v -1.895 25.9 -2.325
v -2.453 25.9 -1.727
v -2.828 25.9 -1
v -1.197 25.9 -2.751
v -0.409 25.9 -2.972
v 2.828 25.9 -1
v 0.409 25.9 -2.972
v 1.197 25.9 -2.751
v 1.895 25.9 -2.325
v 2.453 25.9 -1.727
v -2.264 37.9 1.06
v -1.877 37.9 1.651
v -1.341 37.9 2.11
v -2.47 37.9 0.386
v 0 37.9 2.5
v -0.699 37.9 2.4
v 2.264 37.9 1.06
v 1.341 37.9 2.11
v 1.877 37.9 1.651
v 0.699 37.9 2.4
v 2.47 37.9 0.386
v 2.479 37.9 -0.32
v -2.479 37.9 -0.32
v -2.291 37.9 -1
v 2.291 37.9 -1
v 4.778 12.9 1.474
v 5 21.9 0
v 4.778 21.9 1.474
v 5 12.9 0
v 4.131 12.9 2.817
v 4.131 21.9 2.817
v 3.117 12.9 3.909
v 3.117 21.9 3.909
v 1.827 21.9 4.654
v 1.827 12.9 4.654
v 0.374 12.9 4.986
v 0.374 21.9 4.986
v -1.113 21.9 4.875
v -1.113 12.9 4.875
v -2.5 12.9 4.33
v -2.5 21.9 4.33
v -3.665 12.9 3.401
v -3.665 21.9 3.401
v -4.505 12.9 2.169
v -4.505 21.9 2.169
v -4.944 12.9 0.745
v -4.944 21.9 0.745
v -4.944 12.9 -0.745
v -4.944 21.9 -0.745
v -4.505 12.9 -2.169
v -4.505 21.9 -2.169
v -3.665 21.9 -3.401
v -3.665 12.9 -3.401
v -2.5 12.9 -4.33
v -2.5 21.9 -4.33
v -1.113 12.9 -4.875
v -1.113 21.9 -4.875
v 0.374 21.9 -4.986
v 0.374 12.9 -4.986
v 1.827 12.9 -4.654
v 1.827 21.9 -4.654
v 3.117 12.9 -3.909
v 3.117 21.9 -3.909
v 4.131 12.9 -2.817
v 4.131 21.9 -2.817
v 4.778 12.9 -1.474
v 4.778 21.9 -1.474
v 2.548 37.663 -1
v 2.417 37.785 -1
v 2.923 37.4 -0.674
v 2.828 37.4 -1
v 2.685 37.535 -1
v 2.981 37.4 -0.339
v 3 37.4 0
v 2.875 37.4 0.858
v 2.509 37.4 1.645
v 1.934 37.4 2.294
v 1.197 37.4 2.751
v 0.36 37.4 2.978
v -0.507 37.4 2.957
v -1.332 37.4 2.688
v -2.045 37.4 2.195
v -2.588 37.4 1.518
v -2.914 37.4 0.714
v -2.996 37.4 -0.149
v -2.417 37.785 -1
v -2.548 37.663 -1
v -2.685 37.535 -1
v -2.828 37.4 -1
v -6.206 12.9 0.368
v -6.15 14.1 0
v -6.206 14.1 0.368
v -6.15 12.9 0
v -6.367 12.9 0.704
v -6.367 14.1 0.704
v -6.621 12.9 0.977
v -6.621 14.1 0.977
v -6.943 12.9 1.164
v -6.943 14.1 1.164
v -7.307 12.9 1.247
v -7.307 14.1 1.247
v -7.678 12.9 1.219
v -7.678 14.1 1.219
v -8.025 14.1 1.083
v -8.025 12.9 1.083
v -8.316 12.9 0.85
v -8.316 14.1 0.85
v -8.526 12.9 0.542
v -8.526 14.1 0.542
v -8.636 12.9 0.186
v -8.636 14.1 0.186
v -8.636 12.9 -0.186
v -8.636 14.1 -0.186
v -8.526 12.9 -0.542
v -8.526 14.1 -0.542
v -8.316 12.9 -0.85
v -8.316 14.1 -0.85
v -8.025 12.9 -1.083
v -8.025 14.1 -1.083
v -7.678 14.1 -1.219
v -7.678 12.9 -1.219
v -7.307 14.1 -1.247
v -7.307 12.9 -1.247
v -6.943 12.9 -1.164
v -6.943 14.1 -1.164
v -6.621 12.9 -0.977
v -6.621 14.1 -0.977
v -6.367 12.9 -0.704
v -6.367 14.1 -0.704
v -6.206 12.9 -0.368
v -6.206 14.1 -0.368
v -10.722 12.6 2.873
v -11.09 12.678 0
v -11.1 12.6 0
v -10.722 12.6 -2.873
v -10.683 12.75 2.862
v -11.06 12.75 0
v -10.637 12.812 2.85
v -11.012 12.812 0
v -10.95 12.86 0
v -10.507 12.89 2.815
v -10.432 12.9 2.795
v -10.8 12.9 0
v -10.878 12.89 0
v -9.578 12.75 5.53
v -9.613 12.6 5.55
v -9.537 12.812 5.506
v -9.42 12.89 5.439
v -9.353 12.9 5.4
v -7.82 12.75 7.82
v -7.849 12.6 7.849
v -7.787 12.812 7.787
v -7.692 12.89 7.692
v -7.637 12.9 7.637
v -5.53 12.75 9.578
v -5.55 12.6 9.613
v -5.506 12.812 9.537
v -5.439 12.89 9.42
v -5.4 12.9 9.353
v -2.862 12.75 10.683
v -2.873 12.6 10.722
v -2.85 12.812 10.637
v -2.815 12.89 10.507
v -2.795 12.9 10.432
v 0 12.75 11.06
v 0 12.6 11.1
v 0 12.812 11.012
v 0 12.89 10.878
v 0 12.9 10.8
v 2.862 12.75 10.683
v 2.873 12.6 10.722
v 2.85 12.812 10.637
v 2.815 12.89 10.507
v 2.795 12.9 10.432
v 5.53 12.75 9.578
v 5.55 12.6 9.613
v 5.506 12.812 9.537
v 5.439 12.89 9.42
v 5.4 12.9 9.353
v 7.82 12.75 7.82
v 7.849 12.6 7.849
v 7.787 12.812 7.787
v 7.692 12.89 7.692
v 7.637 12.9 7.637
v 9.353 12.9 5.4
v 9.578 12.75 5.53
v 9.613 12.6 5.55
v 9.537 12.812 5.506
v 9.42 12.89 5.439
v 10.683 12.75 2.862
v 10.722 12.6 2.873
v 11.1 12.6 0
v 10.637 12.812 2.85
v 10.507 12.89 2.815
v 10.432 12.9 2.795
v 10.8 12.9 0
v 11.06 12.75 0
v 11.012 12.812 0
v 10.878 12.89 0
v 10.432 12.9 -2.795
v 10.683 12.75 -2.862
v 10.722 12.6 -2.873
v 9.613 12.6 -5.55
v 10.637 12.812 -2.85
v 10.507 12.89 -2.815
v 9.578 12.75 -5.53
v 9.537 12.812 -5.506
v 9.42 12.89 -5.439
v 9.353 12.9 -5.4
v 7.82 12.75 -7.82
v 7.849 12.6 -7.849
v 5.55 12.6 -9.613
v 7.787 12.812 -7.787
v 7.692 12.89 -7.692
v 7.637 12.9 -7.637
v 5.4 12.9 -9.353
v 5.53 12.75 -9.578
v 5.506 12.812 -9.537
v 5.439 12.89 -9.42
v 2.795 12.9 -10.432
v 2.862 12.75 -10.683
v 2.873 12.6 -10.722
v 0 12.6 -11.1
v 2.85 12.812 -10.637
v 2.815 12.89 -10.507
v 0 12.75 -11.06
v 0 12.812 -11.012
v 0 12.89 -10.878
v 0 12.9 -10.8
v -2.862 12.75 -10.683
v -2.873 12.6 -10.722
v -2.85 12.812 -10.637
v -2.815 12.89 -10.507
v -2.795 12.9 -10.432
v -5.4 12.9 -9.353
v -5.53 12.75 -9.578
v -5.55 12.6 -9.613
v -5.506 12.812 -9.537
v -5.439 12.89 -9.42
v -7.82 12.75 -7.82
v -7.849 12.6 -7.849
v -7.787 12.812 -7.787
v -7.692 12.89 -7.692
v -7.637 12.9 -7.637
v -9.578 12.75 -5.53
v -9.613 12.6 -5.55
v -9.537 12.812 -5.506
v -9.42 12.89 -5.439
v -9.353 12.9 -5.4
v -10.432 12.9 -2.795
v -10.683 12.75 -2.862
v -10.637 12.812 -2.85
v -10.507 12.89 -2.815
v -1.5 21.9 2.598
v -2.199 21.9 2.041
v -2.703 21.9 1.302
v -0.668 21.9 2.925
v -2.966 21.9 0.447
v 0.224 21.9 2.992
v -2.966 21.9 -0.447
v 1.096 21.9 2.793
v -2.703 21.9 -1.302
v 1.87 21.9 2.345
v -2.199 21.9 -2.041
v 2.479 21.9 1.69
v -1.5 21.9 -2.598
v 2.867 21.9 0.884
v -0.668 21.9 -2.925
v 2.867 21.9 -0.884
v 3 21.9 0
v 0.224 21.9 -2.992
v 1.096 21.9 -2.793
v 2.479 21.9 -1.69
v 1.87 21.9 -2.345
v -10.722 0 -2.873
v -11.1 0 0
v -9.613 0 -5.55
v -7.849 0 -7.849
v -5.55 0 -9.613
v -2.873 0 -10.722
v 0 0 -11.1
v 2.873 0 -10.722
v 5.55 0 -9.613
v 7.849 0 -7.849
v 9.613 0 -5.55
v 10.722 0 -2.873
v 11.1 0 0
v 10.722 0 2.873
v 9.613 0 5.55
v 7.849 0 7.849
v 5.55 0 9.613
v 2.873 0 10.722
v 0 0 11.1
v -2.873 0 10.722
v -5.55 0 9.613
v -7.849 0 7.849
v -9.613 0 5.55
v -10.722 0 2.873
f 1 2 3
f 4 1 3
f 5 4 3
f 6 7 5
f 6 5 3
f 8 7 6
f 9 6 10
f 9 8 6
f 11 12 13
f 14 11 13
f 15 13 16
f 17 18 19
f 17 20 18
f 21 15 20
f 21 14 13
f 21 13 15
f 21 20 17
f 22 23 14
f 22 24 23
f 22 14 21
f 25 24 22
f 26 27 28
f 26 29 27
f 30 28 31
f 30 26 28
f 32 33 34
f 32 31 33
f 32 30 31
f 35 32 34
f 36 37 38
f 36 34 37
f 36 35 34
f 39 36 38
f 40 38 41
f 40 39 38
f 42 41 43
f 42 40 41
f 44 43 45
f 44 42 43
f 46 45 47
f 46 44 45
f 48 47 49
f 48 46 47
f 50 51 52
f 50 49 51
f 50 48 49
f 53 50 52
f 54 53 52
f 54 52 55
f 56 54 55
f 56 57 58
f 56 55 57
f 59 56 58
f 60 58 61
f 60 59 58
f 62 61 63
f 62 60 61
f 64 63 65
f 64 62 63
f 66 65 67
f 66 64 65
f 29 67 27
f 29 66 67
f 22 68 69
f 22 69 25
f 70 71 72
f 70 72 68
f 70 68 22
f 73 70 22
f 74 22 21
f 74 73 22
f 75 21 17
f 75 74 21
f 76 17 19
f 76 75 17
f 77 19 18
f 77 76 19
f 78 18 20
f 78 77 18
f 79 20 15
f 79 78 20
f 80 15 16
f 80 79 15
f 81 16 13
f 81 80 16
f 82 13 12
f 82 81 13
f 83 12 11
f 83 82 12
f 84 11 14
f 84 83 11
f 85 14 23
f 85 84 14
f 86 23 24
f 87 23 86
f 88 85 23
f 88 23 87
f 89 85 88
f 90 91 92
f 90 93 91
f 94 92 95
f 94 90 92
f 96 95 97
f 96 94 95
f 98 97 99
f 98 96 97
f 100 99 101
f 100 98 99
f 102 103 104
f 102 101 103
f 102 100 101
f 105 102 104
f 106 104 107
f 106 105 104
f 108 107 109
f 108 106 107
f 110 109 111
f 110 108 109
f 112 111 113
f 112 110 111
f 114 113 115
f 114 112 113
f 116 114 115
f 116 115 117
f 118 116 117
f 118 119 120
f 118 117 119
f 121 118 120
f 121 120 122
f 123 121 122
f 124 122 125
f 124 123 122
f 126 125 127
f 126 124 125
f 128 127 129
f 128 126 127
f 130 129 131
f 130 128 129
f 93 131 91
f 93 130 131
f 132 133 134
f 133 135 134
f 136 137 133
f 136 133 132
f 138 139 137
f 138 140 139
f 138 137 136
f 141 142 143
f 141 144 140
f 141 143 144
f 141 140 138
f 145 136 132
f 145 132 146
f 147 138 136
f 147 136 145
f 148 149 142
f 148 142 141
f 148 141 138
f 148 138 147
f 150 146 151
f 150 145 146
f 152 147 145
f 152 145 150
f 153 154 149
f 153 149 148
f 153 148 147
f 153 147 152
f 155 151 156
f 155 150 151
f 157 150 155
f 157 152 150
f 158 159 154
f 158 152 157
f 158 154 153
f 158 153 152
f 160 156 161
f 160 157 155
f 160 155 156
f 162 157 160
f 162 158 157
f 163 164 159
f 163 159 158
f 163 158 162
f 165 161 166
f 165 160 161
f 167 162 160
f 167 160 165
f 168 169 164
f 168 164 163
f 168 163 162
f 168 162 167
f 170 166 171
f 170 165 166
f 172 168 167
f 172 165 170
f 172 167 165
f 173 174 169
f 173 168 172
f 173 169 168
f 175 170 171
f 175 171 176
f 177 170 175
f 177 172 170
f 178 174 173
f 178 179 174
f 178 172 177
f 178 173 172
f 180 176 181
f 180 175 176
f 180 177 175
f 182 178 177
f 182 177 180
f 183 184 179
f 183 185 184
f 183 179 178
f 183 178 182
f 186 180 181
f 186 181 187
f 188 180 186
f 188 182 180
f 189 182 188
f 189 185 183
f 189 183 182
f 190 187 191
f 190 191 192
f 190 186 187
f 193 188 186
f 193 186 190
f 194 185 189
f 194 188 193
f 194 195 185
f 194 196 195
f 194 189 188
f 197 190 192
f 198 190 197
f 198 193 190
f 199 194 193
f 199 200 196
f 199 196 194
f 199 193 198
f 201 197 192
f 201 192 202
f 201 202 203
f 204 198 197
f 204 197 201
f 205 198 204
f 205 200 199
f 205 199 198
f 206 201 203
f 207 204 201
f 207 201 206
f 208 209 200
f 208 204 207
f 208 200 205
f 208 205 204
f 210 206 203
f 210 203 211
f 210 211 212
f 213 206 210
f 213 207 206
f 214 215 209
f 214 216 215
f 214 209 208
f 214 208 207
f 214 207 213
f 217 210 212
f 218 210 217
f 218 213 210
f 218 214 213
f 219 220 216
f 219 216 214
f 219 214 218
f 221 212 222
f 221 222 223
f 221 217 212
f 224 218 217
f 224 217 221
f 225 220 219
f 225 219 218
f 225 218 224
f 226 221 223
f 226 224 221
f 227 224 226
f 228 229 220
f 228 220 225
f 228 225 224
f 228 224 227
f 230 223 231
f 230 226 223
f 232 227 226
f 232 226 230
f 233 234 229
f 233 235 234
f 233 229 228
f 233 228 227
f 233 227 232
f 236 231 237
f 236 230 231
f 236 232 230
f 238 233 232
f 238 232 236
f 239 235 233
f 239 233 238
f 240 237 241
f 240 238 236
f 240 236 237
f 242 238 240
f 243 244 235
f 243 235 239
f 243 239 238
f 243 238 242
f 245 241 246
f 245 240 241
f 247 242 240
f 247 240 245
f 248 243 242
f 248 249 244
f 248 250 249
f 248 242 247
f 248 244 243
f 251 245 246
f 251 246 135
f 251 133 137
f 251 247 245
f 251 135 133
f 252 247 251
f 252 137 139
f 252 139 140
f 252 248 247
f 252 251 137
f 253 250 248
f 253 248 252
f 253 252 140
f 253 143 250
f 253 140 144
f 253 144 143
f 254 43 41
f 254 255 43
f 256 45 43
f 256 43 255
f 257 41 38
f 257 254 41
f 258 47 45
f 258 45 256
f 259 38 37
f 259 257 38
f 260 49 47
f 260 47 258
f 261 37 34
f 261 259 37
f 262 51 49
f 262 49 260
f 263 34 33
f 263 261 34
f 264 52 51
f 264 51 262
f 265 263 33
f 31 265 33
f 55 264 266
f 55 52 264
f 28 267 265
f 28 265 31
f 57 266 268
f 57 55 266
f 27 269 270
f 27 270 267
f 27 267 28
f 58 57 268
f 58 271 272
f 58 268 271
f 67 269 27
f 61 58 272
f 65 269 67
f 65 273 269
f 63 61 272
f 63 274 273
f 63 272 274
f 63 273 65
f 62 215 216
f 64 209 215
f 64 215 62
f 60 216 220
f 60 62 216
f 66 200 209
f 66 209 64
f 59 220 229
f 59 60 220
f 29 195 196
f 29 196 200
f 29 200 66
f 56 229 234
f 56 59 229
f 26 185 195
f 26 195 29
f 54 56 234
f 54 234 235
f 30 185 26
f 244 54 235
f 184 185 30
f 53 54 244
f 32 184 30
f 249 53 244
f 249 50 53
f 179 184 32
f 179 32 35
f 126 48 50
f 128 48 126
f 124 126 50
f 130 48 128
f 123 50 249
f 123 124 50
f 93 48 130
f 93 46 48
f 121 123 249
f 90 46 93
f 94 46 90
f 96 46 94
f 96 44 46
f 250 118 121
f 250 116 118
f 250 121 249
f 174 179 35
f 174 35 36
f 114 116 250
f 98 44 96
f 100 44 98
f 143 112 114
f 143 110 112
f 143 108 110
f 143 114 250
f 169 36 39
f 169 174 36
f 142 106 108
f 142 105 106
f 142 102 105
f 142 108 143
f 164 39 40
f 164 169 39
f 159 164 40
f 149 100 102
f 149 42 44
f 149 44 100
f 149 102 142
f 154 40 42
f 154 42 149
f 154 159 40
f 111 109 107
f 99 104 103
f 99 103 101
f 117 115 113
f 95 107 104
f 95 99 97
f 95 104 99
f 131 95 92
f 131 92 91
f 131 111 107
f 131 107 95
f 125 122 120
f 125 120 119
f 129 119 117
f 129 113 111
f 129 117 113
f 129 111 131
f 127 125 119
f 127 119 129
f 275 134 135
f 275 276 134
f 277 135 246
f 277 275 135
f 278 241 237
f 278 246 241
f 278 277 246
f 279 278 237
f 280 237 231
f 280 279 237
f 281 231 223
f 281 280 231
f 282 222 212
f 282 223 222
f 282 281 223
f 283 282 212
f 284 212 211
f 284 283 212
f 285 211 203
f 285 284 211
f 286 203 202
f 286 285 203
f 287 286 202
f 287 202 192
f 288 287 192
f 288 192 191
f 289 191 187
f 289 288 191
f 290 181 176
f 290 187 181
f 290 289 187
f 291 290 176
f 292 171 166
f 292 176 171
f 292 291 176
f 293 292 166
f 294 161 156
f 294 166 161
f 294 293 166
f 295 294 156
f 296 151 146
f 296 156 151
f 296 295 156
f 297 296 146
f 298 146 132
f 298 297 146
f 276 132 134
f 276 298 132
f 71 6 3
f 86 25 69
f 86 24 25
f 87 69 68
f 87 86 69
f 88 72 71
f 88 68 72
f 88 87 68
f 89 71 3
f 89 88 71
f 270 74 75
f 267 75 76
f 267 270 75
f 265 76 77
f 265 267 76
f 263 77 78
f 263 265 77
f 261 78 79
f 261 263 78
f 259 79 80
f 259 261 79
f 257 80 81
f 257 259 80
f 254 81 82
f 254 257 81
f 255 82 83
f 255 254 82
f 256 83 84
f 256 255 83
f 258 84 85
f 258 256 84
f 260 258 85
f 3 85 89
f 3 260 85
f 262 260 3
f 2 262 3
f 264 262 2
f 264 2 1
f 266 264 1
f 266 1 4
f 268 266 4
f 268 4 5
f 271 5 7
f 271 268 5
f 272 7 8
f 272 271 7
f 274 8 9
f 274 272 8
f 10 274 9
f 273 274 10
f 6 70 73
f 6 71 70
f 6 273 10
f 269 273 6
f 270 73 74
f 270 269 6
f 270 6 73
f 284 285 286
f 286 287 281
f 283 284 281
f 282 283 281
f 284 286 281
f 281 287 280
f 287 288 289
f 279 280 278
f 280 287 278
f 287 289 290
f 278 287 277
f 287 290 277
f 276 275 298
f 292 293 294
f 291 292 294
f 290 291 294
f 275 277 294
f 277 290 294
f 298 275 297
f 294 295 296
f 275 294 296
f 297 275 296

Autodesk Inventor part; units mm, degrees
ref_plane "YZ Plane" through (0, 0, 0) normal (1, 0, 0) x (0, 1, 0)
ref_plane "XZ Plane" through (0, 0, 0) normal (0, 1, 0) x (-1, 0, 0)
ref_plane "XY Plane" through (0, 0, 0) normal (0, 0, 1) x (1, 0, 0)
sketch "Sketch1" plane through (0, 0, 0) normal (0, 1, 0) x (-1, 0, 0)
  circle A0 centre (0, 0) radius 11.1
  dimension "d0" = 22.2
extrude "Extrusion1" add sketch "Sketch1" along normal blind 12.9
fillet "Fillet1" radius 0.3 1 edges at (11.1, 12.9, 0)
sketch "Sketch2" plane through (0, 12.9, 0) normal (0, 1, 0) x (1, 0, 0)
  circle A0 centre (0, 0) radius 5
  dimension "d4" = 10
extrude "Extrusion2" add sketch "Sketch2" along normal blind 9
sketch "Sketch3" plane through (0, 21.9, 0) normal (0, 1, 0) x (1, 0, 0)
  circle A0 centre (0, 0) radius 3
  dimension "d9" = 6
extrude "Extrusion3" add sketch "Sketch3" along normal blind 16
sketch "Sketch4" plane through (0, 12.9, 0) normal (0, 1, 0) x (1, 0, 0)
  circle A0 centre (-7.4, 0) radius 1.25
  circle A1 centre (0, 0) radius 3 projected
  circle A2 centre (0, 0) radius 5 projected
  dimension "d12" = 2.5
  dimension "d13" = 7.4
  dimension "d14" = 0
extrude "Extrusion4" add sketch "Sketch4" along normal blind 1.2 contours A0
chamfer "Chamfer1" distance 0.5 angle 45 1 edges at (-3, 37.9, 0)
sketch "Sketch5" plane through (0, 37.9, 0) normal (0, 1, 0) x (1, 0, 0)
  line L0 (-3.6948, 5.5128) -> (4.164, 5.5128)
  line L1 (4.164, 5.5128) -> (4.164, 1)
  line L2 (4.164, 1) -> (-3.6948, 1)
  line L3 (-3.6948, 1) -> (-3.6948, 5.5128)
  circle A0 centre (0, 0) radius 3 projected
  dimension "d20" = 4
extrude "Extrusion5" cut sketch "Sketch5" against normal blind 12 contours L0 L1 L2 A0 L3 | A0 L2 picked at (0.6732, 1.4061)
properties part number "PotSensor"
